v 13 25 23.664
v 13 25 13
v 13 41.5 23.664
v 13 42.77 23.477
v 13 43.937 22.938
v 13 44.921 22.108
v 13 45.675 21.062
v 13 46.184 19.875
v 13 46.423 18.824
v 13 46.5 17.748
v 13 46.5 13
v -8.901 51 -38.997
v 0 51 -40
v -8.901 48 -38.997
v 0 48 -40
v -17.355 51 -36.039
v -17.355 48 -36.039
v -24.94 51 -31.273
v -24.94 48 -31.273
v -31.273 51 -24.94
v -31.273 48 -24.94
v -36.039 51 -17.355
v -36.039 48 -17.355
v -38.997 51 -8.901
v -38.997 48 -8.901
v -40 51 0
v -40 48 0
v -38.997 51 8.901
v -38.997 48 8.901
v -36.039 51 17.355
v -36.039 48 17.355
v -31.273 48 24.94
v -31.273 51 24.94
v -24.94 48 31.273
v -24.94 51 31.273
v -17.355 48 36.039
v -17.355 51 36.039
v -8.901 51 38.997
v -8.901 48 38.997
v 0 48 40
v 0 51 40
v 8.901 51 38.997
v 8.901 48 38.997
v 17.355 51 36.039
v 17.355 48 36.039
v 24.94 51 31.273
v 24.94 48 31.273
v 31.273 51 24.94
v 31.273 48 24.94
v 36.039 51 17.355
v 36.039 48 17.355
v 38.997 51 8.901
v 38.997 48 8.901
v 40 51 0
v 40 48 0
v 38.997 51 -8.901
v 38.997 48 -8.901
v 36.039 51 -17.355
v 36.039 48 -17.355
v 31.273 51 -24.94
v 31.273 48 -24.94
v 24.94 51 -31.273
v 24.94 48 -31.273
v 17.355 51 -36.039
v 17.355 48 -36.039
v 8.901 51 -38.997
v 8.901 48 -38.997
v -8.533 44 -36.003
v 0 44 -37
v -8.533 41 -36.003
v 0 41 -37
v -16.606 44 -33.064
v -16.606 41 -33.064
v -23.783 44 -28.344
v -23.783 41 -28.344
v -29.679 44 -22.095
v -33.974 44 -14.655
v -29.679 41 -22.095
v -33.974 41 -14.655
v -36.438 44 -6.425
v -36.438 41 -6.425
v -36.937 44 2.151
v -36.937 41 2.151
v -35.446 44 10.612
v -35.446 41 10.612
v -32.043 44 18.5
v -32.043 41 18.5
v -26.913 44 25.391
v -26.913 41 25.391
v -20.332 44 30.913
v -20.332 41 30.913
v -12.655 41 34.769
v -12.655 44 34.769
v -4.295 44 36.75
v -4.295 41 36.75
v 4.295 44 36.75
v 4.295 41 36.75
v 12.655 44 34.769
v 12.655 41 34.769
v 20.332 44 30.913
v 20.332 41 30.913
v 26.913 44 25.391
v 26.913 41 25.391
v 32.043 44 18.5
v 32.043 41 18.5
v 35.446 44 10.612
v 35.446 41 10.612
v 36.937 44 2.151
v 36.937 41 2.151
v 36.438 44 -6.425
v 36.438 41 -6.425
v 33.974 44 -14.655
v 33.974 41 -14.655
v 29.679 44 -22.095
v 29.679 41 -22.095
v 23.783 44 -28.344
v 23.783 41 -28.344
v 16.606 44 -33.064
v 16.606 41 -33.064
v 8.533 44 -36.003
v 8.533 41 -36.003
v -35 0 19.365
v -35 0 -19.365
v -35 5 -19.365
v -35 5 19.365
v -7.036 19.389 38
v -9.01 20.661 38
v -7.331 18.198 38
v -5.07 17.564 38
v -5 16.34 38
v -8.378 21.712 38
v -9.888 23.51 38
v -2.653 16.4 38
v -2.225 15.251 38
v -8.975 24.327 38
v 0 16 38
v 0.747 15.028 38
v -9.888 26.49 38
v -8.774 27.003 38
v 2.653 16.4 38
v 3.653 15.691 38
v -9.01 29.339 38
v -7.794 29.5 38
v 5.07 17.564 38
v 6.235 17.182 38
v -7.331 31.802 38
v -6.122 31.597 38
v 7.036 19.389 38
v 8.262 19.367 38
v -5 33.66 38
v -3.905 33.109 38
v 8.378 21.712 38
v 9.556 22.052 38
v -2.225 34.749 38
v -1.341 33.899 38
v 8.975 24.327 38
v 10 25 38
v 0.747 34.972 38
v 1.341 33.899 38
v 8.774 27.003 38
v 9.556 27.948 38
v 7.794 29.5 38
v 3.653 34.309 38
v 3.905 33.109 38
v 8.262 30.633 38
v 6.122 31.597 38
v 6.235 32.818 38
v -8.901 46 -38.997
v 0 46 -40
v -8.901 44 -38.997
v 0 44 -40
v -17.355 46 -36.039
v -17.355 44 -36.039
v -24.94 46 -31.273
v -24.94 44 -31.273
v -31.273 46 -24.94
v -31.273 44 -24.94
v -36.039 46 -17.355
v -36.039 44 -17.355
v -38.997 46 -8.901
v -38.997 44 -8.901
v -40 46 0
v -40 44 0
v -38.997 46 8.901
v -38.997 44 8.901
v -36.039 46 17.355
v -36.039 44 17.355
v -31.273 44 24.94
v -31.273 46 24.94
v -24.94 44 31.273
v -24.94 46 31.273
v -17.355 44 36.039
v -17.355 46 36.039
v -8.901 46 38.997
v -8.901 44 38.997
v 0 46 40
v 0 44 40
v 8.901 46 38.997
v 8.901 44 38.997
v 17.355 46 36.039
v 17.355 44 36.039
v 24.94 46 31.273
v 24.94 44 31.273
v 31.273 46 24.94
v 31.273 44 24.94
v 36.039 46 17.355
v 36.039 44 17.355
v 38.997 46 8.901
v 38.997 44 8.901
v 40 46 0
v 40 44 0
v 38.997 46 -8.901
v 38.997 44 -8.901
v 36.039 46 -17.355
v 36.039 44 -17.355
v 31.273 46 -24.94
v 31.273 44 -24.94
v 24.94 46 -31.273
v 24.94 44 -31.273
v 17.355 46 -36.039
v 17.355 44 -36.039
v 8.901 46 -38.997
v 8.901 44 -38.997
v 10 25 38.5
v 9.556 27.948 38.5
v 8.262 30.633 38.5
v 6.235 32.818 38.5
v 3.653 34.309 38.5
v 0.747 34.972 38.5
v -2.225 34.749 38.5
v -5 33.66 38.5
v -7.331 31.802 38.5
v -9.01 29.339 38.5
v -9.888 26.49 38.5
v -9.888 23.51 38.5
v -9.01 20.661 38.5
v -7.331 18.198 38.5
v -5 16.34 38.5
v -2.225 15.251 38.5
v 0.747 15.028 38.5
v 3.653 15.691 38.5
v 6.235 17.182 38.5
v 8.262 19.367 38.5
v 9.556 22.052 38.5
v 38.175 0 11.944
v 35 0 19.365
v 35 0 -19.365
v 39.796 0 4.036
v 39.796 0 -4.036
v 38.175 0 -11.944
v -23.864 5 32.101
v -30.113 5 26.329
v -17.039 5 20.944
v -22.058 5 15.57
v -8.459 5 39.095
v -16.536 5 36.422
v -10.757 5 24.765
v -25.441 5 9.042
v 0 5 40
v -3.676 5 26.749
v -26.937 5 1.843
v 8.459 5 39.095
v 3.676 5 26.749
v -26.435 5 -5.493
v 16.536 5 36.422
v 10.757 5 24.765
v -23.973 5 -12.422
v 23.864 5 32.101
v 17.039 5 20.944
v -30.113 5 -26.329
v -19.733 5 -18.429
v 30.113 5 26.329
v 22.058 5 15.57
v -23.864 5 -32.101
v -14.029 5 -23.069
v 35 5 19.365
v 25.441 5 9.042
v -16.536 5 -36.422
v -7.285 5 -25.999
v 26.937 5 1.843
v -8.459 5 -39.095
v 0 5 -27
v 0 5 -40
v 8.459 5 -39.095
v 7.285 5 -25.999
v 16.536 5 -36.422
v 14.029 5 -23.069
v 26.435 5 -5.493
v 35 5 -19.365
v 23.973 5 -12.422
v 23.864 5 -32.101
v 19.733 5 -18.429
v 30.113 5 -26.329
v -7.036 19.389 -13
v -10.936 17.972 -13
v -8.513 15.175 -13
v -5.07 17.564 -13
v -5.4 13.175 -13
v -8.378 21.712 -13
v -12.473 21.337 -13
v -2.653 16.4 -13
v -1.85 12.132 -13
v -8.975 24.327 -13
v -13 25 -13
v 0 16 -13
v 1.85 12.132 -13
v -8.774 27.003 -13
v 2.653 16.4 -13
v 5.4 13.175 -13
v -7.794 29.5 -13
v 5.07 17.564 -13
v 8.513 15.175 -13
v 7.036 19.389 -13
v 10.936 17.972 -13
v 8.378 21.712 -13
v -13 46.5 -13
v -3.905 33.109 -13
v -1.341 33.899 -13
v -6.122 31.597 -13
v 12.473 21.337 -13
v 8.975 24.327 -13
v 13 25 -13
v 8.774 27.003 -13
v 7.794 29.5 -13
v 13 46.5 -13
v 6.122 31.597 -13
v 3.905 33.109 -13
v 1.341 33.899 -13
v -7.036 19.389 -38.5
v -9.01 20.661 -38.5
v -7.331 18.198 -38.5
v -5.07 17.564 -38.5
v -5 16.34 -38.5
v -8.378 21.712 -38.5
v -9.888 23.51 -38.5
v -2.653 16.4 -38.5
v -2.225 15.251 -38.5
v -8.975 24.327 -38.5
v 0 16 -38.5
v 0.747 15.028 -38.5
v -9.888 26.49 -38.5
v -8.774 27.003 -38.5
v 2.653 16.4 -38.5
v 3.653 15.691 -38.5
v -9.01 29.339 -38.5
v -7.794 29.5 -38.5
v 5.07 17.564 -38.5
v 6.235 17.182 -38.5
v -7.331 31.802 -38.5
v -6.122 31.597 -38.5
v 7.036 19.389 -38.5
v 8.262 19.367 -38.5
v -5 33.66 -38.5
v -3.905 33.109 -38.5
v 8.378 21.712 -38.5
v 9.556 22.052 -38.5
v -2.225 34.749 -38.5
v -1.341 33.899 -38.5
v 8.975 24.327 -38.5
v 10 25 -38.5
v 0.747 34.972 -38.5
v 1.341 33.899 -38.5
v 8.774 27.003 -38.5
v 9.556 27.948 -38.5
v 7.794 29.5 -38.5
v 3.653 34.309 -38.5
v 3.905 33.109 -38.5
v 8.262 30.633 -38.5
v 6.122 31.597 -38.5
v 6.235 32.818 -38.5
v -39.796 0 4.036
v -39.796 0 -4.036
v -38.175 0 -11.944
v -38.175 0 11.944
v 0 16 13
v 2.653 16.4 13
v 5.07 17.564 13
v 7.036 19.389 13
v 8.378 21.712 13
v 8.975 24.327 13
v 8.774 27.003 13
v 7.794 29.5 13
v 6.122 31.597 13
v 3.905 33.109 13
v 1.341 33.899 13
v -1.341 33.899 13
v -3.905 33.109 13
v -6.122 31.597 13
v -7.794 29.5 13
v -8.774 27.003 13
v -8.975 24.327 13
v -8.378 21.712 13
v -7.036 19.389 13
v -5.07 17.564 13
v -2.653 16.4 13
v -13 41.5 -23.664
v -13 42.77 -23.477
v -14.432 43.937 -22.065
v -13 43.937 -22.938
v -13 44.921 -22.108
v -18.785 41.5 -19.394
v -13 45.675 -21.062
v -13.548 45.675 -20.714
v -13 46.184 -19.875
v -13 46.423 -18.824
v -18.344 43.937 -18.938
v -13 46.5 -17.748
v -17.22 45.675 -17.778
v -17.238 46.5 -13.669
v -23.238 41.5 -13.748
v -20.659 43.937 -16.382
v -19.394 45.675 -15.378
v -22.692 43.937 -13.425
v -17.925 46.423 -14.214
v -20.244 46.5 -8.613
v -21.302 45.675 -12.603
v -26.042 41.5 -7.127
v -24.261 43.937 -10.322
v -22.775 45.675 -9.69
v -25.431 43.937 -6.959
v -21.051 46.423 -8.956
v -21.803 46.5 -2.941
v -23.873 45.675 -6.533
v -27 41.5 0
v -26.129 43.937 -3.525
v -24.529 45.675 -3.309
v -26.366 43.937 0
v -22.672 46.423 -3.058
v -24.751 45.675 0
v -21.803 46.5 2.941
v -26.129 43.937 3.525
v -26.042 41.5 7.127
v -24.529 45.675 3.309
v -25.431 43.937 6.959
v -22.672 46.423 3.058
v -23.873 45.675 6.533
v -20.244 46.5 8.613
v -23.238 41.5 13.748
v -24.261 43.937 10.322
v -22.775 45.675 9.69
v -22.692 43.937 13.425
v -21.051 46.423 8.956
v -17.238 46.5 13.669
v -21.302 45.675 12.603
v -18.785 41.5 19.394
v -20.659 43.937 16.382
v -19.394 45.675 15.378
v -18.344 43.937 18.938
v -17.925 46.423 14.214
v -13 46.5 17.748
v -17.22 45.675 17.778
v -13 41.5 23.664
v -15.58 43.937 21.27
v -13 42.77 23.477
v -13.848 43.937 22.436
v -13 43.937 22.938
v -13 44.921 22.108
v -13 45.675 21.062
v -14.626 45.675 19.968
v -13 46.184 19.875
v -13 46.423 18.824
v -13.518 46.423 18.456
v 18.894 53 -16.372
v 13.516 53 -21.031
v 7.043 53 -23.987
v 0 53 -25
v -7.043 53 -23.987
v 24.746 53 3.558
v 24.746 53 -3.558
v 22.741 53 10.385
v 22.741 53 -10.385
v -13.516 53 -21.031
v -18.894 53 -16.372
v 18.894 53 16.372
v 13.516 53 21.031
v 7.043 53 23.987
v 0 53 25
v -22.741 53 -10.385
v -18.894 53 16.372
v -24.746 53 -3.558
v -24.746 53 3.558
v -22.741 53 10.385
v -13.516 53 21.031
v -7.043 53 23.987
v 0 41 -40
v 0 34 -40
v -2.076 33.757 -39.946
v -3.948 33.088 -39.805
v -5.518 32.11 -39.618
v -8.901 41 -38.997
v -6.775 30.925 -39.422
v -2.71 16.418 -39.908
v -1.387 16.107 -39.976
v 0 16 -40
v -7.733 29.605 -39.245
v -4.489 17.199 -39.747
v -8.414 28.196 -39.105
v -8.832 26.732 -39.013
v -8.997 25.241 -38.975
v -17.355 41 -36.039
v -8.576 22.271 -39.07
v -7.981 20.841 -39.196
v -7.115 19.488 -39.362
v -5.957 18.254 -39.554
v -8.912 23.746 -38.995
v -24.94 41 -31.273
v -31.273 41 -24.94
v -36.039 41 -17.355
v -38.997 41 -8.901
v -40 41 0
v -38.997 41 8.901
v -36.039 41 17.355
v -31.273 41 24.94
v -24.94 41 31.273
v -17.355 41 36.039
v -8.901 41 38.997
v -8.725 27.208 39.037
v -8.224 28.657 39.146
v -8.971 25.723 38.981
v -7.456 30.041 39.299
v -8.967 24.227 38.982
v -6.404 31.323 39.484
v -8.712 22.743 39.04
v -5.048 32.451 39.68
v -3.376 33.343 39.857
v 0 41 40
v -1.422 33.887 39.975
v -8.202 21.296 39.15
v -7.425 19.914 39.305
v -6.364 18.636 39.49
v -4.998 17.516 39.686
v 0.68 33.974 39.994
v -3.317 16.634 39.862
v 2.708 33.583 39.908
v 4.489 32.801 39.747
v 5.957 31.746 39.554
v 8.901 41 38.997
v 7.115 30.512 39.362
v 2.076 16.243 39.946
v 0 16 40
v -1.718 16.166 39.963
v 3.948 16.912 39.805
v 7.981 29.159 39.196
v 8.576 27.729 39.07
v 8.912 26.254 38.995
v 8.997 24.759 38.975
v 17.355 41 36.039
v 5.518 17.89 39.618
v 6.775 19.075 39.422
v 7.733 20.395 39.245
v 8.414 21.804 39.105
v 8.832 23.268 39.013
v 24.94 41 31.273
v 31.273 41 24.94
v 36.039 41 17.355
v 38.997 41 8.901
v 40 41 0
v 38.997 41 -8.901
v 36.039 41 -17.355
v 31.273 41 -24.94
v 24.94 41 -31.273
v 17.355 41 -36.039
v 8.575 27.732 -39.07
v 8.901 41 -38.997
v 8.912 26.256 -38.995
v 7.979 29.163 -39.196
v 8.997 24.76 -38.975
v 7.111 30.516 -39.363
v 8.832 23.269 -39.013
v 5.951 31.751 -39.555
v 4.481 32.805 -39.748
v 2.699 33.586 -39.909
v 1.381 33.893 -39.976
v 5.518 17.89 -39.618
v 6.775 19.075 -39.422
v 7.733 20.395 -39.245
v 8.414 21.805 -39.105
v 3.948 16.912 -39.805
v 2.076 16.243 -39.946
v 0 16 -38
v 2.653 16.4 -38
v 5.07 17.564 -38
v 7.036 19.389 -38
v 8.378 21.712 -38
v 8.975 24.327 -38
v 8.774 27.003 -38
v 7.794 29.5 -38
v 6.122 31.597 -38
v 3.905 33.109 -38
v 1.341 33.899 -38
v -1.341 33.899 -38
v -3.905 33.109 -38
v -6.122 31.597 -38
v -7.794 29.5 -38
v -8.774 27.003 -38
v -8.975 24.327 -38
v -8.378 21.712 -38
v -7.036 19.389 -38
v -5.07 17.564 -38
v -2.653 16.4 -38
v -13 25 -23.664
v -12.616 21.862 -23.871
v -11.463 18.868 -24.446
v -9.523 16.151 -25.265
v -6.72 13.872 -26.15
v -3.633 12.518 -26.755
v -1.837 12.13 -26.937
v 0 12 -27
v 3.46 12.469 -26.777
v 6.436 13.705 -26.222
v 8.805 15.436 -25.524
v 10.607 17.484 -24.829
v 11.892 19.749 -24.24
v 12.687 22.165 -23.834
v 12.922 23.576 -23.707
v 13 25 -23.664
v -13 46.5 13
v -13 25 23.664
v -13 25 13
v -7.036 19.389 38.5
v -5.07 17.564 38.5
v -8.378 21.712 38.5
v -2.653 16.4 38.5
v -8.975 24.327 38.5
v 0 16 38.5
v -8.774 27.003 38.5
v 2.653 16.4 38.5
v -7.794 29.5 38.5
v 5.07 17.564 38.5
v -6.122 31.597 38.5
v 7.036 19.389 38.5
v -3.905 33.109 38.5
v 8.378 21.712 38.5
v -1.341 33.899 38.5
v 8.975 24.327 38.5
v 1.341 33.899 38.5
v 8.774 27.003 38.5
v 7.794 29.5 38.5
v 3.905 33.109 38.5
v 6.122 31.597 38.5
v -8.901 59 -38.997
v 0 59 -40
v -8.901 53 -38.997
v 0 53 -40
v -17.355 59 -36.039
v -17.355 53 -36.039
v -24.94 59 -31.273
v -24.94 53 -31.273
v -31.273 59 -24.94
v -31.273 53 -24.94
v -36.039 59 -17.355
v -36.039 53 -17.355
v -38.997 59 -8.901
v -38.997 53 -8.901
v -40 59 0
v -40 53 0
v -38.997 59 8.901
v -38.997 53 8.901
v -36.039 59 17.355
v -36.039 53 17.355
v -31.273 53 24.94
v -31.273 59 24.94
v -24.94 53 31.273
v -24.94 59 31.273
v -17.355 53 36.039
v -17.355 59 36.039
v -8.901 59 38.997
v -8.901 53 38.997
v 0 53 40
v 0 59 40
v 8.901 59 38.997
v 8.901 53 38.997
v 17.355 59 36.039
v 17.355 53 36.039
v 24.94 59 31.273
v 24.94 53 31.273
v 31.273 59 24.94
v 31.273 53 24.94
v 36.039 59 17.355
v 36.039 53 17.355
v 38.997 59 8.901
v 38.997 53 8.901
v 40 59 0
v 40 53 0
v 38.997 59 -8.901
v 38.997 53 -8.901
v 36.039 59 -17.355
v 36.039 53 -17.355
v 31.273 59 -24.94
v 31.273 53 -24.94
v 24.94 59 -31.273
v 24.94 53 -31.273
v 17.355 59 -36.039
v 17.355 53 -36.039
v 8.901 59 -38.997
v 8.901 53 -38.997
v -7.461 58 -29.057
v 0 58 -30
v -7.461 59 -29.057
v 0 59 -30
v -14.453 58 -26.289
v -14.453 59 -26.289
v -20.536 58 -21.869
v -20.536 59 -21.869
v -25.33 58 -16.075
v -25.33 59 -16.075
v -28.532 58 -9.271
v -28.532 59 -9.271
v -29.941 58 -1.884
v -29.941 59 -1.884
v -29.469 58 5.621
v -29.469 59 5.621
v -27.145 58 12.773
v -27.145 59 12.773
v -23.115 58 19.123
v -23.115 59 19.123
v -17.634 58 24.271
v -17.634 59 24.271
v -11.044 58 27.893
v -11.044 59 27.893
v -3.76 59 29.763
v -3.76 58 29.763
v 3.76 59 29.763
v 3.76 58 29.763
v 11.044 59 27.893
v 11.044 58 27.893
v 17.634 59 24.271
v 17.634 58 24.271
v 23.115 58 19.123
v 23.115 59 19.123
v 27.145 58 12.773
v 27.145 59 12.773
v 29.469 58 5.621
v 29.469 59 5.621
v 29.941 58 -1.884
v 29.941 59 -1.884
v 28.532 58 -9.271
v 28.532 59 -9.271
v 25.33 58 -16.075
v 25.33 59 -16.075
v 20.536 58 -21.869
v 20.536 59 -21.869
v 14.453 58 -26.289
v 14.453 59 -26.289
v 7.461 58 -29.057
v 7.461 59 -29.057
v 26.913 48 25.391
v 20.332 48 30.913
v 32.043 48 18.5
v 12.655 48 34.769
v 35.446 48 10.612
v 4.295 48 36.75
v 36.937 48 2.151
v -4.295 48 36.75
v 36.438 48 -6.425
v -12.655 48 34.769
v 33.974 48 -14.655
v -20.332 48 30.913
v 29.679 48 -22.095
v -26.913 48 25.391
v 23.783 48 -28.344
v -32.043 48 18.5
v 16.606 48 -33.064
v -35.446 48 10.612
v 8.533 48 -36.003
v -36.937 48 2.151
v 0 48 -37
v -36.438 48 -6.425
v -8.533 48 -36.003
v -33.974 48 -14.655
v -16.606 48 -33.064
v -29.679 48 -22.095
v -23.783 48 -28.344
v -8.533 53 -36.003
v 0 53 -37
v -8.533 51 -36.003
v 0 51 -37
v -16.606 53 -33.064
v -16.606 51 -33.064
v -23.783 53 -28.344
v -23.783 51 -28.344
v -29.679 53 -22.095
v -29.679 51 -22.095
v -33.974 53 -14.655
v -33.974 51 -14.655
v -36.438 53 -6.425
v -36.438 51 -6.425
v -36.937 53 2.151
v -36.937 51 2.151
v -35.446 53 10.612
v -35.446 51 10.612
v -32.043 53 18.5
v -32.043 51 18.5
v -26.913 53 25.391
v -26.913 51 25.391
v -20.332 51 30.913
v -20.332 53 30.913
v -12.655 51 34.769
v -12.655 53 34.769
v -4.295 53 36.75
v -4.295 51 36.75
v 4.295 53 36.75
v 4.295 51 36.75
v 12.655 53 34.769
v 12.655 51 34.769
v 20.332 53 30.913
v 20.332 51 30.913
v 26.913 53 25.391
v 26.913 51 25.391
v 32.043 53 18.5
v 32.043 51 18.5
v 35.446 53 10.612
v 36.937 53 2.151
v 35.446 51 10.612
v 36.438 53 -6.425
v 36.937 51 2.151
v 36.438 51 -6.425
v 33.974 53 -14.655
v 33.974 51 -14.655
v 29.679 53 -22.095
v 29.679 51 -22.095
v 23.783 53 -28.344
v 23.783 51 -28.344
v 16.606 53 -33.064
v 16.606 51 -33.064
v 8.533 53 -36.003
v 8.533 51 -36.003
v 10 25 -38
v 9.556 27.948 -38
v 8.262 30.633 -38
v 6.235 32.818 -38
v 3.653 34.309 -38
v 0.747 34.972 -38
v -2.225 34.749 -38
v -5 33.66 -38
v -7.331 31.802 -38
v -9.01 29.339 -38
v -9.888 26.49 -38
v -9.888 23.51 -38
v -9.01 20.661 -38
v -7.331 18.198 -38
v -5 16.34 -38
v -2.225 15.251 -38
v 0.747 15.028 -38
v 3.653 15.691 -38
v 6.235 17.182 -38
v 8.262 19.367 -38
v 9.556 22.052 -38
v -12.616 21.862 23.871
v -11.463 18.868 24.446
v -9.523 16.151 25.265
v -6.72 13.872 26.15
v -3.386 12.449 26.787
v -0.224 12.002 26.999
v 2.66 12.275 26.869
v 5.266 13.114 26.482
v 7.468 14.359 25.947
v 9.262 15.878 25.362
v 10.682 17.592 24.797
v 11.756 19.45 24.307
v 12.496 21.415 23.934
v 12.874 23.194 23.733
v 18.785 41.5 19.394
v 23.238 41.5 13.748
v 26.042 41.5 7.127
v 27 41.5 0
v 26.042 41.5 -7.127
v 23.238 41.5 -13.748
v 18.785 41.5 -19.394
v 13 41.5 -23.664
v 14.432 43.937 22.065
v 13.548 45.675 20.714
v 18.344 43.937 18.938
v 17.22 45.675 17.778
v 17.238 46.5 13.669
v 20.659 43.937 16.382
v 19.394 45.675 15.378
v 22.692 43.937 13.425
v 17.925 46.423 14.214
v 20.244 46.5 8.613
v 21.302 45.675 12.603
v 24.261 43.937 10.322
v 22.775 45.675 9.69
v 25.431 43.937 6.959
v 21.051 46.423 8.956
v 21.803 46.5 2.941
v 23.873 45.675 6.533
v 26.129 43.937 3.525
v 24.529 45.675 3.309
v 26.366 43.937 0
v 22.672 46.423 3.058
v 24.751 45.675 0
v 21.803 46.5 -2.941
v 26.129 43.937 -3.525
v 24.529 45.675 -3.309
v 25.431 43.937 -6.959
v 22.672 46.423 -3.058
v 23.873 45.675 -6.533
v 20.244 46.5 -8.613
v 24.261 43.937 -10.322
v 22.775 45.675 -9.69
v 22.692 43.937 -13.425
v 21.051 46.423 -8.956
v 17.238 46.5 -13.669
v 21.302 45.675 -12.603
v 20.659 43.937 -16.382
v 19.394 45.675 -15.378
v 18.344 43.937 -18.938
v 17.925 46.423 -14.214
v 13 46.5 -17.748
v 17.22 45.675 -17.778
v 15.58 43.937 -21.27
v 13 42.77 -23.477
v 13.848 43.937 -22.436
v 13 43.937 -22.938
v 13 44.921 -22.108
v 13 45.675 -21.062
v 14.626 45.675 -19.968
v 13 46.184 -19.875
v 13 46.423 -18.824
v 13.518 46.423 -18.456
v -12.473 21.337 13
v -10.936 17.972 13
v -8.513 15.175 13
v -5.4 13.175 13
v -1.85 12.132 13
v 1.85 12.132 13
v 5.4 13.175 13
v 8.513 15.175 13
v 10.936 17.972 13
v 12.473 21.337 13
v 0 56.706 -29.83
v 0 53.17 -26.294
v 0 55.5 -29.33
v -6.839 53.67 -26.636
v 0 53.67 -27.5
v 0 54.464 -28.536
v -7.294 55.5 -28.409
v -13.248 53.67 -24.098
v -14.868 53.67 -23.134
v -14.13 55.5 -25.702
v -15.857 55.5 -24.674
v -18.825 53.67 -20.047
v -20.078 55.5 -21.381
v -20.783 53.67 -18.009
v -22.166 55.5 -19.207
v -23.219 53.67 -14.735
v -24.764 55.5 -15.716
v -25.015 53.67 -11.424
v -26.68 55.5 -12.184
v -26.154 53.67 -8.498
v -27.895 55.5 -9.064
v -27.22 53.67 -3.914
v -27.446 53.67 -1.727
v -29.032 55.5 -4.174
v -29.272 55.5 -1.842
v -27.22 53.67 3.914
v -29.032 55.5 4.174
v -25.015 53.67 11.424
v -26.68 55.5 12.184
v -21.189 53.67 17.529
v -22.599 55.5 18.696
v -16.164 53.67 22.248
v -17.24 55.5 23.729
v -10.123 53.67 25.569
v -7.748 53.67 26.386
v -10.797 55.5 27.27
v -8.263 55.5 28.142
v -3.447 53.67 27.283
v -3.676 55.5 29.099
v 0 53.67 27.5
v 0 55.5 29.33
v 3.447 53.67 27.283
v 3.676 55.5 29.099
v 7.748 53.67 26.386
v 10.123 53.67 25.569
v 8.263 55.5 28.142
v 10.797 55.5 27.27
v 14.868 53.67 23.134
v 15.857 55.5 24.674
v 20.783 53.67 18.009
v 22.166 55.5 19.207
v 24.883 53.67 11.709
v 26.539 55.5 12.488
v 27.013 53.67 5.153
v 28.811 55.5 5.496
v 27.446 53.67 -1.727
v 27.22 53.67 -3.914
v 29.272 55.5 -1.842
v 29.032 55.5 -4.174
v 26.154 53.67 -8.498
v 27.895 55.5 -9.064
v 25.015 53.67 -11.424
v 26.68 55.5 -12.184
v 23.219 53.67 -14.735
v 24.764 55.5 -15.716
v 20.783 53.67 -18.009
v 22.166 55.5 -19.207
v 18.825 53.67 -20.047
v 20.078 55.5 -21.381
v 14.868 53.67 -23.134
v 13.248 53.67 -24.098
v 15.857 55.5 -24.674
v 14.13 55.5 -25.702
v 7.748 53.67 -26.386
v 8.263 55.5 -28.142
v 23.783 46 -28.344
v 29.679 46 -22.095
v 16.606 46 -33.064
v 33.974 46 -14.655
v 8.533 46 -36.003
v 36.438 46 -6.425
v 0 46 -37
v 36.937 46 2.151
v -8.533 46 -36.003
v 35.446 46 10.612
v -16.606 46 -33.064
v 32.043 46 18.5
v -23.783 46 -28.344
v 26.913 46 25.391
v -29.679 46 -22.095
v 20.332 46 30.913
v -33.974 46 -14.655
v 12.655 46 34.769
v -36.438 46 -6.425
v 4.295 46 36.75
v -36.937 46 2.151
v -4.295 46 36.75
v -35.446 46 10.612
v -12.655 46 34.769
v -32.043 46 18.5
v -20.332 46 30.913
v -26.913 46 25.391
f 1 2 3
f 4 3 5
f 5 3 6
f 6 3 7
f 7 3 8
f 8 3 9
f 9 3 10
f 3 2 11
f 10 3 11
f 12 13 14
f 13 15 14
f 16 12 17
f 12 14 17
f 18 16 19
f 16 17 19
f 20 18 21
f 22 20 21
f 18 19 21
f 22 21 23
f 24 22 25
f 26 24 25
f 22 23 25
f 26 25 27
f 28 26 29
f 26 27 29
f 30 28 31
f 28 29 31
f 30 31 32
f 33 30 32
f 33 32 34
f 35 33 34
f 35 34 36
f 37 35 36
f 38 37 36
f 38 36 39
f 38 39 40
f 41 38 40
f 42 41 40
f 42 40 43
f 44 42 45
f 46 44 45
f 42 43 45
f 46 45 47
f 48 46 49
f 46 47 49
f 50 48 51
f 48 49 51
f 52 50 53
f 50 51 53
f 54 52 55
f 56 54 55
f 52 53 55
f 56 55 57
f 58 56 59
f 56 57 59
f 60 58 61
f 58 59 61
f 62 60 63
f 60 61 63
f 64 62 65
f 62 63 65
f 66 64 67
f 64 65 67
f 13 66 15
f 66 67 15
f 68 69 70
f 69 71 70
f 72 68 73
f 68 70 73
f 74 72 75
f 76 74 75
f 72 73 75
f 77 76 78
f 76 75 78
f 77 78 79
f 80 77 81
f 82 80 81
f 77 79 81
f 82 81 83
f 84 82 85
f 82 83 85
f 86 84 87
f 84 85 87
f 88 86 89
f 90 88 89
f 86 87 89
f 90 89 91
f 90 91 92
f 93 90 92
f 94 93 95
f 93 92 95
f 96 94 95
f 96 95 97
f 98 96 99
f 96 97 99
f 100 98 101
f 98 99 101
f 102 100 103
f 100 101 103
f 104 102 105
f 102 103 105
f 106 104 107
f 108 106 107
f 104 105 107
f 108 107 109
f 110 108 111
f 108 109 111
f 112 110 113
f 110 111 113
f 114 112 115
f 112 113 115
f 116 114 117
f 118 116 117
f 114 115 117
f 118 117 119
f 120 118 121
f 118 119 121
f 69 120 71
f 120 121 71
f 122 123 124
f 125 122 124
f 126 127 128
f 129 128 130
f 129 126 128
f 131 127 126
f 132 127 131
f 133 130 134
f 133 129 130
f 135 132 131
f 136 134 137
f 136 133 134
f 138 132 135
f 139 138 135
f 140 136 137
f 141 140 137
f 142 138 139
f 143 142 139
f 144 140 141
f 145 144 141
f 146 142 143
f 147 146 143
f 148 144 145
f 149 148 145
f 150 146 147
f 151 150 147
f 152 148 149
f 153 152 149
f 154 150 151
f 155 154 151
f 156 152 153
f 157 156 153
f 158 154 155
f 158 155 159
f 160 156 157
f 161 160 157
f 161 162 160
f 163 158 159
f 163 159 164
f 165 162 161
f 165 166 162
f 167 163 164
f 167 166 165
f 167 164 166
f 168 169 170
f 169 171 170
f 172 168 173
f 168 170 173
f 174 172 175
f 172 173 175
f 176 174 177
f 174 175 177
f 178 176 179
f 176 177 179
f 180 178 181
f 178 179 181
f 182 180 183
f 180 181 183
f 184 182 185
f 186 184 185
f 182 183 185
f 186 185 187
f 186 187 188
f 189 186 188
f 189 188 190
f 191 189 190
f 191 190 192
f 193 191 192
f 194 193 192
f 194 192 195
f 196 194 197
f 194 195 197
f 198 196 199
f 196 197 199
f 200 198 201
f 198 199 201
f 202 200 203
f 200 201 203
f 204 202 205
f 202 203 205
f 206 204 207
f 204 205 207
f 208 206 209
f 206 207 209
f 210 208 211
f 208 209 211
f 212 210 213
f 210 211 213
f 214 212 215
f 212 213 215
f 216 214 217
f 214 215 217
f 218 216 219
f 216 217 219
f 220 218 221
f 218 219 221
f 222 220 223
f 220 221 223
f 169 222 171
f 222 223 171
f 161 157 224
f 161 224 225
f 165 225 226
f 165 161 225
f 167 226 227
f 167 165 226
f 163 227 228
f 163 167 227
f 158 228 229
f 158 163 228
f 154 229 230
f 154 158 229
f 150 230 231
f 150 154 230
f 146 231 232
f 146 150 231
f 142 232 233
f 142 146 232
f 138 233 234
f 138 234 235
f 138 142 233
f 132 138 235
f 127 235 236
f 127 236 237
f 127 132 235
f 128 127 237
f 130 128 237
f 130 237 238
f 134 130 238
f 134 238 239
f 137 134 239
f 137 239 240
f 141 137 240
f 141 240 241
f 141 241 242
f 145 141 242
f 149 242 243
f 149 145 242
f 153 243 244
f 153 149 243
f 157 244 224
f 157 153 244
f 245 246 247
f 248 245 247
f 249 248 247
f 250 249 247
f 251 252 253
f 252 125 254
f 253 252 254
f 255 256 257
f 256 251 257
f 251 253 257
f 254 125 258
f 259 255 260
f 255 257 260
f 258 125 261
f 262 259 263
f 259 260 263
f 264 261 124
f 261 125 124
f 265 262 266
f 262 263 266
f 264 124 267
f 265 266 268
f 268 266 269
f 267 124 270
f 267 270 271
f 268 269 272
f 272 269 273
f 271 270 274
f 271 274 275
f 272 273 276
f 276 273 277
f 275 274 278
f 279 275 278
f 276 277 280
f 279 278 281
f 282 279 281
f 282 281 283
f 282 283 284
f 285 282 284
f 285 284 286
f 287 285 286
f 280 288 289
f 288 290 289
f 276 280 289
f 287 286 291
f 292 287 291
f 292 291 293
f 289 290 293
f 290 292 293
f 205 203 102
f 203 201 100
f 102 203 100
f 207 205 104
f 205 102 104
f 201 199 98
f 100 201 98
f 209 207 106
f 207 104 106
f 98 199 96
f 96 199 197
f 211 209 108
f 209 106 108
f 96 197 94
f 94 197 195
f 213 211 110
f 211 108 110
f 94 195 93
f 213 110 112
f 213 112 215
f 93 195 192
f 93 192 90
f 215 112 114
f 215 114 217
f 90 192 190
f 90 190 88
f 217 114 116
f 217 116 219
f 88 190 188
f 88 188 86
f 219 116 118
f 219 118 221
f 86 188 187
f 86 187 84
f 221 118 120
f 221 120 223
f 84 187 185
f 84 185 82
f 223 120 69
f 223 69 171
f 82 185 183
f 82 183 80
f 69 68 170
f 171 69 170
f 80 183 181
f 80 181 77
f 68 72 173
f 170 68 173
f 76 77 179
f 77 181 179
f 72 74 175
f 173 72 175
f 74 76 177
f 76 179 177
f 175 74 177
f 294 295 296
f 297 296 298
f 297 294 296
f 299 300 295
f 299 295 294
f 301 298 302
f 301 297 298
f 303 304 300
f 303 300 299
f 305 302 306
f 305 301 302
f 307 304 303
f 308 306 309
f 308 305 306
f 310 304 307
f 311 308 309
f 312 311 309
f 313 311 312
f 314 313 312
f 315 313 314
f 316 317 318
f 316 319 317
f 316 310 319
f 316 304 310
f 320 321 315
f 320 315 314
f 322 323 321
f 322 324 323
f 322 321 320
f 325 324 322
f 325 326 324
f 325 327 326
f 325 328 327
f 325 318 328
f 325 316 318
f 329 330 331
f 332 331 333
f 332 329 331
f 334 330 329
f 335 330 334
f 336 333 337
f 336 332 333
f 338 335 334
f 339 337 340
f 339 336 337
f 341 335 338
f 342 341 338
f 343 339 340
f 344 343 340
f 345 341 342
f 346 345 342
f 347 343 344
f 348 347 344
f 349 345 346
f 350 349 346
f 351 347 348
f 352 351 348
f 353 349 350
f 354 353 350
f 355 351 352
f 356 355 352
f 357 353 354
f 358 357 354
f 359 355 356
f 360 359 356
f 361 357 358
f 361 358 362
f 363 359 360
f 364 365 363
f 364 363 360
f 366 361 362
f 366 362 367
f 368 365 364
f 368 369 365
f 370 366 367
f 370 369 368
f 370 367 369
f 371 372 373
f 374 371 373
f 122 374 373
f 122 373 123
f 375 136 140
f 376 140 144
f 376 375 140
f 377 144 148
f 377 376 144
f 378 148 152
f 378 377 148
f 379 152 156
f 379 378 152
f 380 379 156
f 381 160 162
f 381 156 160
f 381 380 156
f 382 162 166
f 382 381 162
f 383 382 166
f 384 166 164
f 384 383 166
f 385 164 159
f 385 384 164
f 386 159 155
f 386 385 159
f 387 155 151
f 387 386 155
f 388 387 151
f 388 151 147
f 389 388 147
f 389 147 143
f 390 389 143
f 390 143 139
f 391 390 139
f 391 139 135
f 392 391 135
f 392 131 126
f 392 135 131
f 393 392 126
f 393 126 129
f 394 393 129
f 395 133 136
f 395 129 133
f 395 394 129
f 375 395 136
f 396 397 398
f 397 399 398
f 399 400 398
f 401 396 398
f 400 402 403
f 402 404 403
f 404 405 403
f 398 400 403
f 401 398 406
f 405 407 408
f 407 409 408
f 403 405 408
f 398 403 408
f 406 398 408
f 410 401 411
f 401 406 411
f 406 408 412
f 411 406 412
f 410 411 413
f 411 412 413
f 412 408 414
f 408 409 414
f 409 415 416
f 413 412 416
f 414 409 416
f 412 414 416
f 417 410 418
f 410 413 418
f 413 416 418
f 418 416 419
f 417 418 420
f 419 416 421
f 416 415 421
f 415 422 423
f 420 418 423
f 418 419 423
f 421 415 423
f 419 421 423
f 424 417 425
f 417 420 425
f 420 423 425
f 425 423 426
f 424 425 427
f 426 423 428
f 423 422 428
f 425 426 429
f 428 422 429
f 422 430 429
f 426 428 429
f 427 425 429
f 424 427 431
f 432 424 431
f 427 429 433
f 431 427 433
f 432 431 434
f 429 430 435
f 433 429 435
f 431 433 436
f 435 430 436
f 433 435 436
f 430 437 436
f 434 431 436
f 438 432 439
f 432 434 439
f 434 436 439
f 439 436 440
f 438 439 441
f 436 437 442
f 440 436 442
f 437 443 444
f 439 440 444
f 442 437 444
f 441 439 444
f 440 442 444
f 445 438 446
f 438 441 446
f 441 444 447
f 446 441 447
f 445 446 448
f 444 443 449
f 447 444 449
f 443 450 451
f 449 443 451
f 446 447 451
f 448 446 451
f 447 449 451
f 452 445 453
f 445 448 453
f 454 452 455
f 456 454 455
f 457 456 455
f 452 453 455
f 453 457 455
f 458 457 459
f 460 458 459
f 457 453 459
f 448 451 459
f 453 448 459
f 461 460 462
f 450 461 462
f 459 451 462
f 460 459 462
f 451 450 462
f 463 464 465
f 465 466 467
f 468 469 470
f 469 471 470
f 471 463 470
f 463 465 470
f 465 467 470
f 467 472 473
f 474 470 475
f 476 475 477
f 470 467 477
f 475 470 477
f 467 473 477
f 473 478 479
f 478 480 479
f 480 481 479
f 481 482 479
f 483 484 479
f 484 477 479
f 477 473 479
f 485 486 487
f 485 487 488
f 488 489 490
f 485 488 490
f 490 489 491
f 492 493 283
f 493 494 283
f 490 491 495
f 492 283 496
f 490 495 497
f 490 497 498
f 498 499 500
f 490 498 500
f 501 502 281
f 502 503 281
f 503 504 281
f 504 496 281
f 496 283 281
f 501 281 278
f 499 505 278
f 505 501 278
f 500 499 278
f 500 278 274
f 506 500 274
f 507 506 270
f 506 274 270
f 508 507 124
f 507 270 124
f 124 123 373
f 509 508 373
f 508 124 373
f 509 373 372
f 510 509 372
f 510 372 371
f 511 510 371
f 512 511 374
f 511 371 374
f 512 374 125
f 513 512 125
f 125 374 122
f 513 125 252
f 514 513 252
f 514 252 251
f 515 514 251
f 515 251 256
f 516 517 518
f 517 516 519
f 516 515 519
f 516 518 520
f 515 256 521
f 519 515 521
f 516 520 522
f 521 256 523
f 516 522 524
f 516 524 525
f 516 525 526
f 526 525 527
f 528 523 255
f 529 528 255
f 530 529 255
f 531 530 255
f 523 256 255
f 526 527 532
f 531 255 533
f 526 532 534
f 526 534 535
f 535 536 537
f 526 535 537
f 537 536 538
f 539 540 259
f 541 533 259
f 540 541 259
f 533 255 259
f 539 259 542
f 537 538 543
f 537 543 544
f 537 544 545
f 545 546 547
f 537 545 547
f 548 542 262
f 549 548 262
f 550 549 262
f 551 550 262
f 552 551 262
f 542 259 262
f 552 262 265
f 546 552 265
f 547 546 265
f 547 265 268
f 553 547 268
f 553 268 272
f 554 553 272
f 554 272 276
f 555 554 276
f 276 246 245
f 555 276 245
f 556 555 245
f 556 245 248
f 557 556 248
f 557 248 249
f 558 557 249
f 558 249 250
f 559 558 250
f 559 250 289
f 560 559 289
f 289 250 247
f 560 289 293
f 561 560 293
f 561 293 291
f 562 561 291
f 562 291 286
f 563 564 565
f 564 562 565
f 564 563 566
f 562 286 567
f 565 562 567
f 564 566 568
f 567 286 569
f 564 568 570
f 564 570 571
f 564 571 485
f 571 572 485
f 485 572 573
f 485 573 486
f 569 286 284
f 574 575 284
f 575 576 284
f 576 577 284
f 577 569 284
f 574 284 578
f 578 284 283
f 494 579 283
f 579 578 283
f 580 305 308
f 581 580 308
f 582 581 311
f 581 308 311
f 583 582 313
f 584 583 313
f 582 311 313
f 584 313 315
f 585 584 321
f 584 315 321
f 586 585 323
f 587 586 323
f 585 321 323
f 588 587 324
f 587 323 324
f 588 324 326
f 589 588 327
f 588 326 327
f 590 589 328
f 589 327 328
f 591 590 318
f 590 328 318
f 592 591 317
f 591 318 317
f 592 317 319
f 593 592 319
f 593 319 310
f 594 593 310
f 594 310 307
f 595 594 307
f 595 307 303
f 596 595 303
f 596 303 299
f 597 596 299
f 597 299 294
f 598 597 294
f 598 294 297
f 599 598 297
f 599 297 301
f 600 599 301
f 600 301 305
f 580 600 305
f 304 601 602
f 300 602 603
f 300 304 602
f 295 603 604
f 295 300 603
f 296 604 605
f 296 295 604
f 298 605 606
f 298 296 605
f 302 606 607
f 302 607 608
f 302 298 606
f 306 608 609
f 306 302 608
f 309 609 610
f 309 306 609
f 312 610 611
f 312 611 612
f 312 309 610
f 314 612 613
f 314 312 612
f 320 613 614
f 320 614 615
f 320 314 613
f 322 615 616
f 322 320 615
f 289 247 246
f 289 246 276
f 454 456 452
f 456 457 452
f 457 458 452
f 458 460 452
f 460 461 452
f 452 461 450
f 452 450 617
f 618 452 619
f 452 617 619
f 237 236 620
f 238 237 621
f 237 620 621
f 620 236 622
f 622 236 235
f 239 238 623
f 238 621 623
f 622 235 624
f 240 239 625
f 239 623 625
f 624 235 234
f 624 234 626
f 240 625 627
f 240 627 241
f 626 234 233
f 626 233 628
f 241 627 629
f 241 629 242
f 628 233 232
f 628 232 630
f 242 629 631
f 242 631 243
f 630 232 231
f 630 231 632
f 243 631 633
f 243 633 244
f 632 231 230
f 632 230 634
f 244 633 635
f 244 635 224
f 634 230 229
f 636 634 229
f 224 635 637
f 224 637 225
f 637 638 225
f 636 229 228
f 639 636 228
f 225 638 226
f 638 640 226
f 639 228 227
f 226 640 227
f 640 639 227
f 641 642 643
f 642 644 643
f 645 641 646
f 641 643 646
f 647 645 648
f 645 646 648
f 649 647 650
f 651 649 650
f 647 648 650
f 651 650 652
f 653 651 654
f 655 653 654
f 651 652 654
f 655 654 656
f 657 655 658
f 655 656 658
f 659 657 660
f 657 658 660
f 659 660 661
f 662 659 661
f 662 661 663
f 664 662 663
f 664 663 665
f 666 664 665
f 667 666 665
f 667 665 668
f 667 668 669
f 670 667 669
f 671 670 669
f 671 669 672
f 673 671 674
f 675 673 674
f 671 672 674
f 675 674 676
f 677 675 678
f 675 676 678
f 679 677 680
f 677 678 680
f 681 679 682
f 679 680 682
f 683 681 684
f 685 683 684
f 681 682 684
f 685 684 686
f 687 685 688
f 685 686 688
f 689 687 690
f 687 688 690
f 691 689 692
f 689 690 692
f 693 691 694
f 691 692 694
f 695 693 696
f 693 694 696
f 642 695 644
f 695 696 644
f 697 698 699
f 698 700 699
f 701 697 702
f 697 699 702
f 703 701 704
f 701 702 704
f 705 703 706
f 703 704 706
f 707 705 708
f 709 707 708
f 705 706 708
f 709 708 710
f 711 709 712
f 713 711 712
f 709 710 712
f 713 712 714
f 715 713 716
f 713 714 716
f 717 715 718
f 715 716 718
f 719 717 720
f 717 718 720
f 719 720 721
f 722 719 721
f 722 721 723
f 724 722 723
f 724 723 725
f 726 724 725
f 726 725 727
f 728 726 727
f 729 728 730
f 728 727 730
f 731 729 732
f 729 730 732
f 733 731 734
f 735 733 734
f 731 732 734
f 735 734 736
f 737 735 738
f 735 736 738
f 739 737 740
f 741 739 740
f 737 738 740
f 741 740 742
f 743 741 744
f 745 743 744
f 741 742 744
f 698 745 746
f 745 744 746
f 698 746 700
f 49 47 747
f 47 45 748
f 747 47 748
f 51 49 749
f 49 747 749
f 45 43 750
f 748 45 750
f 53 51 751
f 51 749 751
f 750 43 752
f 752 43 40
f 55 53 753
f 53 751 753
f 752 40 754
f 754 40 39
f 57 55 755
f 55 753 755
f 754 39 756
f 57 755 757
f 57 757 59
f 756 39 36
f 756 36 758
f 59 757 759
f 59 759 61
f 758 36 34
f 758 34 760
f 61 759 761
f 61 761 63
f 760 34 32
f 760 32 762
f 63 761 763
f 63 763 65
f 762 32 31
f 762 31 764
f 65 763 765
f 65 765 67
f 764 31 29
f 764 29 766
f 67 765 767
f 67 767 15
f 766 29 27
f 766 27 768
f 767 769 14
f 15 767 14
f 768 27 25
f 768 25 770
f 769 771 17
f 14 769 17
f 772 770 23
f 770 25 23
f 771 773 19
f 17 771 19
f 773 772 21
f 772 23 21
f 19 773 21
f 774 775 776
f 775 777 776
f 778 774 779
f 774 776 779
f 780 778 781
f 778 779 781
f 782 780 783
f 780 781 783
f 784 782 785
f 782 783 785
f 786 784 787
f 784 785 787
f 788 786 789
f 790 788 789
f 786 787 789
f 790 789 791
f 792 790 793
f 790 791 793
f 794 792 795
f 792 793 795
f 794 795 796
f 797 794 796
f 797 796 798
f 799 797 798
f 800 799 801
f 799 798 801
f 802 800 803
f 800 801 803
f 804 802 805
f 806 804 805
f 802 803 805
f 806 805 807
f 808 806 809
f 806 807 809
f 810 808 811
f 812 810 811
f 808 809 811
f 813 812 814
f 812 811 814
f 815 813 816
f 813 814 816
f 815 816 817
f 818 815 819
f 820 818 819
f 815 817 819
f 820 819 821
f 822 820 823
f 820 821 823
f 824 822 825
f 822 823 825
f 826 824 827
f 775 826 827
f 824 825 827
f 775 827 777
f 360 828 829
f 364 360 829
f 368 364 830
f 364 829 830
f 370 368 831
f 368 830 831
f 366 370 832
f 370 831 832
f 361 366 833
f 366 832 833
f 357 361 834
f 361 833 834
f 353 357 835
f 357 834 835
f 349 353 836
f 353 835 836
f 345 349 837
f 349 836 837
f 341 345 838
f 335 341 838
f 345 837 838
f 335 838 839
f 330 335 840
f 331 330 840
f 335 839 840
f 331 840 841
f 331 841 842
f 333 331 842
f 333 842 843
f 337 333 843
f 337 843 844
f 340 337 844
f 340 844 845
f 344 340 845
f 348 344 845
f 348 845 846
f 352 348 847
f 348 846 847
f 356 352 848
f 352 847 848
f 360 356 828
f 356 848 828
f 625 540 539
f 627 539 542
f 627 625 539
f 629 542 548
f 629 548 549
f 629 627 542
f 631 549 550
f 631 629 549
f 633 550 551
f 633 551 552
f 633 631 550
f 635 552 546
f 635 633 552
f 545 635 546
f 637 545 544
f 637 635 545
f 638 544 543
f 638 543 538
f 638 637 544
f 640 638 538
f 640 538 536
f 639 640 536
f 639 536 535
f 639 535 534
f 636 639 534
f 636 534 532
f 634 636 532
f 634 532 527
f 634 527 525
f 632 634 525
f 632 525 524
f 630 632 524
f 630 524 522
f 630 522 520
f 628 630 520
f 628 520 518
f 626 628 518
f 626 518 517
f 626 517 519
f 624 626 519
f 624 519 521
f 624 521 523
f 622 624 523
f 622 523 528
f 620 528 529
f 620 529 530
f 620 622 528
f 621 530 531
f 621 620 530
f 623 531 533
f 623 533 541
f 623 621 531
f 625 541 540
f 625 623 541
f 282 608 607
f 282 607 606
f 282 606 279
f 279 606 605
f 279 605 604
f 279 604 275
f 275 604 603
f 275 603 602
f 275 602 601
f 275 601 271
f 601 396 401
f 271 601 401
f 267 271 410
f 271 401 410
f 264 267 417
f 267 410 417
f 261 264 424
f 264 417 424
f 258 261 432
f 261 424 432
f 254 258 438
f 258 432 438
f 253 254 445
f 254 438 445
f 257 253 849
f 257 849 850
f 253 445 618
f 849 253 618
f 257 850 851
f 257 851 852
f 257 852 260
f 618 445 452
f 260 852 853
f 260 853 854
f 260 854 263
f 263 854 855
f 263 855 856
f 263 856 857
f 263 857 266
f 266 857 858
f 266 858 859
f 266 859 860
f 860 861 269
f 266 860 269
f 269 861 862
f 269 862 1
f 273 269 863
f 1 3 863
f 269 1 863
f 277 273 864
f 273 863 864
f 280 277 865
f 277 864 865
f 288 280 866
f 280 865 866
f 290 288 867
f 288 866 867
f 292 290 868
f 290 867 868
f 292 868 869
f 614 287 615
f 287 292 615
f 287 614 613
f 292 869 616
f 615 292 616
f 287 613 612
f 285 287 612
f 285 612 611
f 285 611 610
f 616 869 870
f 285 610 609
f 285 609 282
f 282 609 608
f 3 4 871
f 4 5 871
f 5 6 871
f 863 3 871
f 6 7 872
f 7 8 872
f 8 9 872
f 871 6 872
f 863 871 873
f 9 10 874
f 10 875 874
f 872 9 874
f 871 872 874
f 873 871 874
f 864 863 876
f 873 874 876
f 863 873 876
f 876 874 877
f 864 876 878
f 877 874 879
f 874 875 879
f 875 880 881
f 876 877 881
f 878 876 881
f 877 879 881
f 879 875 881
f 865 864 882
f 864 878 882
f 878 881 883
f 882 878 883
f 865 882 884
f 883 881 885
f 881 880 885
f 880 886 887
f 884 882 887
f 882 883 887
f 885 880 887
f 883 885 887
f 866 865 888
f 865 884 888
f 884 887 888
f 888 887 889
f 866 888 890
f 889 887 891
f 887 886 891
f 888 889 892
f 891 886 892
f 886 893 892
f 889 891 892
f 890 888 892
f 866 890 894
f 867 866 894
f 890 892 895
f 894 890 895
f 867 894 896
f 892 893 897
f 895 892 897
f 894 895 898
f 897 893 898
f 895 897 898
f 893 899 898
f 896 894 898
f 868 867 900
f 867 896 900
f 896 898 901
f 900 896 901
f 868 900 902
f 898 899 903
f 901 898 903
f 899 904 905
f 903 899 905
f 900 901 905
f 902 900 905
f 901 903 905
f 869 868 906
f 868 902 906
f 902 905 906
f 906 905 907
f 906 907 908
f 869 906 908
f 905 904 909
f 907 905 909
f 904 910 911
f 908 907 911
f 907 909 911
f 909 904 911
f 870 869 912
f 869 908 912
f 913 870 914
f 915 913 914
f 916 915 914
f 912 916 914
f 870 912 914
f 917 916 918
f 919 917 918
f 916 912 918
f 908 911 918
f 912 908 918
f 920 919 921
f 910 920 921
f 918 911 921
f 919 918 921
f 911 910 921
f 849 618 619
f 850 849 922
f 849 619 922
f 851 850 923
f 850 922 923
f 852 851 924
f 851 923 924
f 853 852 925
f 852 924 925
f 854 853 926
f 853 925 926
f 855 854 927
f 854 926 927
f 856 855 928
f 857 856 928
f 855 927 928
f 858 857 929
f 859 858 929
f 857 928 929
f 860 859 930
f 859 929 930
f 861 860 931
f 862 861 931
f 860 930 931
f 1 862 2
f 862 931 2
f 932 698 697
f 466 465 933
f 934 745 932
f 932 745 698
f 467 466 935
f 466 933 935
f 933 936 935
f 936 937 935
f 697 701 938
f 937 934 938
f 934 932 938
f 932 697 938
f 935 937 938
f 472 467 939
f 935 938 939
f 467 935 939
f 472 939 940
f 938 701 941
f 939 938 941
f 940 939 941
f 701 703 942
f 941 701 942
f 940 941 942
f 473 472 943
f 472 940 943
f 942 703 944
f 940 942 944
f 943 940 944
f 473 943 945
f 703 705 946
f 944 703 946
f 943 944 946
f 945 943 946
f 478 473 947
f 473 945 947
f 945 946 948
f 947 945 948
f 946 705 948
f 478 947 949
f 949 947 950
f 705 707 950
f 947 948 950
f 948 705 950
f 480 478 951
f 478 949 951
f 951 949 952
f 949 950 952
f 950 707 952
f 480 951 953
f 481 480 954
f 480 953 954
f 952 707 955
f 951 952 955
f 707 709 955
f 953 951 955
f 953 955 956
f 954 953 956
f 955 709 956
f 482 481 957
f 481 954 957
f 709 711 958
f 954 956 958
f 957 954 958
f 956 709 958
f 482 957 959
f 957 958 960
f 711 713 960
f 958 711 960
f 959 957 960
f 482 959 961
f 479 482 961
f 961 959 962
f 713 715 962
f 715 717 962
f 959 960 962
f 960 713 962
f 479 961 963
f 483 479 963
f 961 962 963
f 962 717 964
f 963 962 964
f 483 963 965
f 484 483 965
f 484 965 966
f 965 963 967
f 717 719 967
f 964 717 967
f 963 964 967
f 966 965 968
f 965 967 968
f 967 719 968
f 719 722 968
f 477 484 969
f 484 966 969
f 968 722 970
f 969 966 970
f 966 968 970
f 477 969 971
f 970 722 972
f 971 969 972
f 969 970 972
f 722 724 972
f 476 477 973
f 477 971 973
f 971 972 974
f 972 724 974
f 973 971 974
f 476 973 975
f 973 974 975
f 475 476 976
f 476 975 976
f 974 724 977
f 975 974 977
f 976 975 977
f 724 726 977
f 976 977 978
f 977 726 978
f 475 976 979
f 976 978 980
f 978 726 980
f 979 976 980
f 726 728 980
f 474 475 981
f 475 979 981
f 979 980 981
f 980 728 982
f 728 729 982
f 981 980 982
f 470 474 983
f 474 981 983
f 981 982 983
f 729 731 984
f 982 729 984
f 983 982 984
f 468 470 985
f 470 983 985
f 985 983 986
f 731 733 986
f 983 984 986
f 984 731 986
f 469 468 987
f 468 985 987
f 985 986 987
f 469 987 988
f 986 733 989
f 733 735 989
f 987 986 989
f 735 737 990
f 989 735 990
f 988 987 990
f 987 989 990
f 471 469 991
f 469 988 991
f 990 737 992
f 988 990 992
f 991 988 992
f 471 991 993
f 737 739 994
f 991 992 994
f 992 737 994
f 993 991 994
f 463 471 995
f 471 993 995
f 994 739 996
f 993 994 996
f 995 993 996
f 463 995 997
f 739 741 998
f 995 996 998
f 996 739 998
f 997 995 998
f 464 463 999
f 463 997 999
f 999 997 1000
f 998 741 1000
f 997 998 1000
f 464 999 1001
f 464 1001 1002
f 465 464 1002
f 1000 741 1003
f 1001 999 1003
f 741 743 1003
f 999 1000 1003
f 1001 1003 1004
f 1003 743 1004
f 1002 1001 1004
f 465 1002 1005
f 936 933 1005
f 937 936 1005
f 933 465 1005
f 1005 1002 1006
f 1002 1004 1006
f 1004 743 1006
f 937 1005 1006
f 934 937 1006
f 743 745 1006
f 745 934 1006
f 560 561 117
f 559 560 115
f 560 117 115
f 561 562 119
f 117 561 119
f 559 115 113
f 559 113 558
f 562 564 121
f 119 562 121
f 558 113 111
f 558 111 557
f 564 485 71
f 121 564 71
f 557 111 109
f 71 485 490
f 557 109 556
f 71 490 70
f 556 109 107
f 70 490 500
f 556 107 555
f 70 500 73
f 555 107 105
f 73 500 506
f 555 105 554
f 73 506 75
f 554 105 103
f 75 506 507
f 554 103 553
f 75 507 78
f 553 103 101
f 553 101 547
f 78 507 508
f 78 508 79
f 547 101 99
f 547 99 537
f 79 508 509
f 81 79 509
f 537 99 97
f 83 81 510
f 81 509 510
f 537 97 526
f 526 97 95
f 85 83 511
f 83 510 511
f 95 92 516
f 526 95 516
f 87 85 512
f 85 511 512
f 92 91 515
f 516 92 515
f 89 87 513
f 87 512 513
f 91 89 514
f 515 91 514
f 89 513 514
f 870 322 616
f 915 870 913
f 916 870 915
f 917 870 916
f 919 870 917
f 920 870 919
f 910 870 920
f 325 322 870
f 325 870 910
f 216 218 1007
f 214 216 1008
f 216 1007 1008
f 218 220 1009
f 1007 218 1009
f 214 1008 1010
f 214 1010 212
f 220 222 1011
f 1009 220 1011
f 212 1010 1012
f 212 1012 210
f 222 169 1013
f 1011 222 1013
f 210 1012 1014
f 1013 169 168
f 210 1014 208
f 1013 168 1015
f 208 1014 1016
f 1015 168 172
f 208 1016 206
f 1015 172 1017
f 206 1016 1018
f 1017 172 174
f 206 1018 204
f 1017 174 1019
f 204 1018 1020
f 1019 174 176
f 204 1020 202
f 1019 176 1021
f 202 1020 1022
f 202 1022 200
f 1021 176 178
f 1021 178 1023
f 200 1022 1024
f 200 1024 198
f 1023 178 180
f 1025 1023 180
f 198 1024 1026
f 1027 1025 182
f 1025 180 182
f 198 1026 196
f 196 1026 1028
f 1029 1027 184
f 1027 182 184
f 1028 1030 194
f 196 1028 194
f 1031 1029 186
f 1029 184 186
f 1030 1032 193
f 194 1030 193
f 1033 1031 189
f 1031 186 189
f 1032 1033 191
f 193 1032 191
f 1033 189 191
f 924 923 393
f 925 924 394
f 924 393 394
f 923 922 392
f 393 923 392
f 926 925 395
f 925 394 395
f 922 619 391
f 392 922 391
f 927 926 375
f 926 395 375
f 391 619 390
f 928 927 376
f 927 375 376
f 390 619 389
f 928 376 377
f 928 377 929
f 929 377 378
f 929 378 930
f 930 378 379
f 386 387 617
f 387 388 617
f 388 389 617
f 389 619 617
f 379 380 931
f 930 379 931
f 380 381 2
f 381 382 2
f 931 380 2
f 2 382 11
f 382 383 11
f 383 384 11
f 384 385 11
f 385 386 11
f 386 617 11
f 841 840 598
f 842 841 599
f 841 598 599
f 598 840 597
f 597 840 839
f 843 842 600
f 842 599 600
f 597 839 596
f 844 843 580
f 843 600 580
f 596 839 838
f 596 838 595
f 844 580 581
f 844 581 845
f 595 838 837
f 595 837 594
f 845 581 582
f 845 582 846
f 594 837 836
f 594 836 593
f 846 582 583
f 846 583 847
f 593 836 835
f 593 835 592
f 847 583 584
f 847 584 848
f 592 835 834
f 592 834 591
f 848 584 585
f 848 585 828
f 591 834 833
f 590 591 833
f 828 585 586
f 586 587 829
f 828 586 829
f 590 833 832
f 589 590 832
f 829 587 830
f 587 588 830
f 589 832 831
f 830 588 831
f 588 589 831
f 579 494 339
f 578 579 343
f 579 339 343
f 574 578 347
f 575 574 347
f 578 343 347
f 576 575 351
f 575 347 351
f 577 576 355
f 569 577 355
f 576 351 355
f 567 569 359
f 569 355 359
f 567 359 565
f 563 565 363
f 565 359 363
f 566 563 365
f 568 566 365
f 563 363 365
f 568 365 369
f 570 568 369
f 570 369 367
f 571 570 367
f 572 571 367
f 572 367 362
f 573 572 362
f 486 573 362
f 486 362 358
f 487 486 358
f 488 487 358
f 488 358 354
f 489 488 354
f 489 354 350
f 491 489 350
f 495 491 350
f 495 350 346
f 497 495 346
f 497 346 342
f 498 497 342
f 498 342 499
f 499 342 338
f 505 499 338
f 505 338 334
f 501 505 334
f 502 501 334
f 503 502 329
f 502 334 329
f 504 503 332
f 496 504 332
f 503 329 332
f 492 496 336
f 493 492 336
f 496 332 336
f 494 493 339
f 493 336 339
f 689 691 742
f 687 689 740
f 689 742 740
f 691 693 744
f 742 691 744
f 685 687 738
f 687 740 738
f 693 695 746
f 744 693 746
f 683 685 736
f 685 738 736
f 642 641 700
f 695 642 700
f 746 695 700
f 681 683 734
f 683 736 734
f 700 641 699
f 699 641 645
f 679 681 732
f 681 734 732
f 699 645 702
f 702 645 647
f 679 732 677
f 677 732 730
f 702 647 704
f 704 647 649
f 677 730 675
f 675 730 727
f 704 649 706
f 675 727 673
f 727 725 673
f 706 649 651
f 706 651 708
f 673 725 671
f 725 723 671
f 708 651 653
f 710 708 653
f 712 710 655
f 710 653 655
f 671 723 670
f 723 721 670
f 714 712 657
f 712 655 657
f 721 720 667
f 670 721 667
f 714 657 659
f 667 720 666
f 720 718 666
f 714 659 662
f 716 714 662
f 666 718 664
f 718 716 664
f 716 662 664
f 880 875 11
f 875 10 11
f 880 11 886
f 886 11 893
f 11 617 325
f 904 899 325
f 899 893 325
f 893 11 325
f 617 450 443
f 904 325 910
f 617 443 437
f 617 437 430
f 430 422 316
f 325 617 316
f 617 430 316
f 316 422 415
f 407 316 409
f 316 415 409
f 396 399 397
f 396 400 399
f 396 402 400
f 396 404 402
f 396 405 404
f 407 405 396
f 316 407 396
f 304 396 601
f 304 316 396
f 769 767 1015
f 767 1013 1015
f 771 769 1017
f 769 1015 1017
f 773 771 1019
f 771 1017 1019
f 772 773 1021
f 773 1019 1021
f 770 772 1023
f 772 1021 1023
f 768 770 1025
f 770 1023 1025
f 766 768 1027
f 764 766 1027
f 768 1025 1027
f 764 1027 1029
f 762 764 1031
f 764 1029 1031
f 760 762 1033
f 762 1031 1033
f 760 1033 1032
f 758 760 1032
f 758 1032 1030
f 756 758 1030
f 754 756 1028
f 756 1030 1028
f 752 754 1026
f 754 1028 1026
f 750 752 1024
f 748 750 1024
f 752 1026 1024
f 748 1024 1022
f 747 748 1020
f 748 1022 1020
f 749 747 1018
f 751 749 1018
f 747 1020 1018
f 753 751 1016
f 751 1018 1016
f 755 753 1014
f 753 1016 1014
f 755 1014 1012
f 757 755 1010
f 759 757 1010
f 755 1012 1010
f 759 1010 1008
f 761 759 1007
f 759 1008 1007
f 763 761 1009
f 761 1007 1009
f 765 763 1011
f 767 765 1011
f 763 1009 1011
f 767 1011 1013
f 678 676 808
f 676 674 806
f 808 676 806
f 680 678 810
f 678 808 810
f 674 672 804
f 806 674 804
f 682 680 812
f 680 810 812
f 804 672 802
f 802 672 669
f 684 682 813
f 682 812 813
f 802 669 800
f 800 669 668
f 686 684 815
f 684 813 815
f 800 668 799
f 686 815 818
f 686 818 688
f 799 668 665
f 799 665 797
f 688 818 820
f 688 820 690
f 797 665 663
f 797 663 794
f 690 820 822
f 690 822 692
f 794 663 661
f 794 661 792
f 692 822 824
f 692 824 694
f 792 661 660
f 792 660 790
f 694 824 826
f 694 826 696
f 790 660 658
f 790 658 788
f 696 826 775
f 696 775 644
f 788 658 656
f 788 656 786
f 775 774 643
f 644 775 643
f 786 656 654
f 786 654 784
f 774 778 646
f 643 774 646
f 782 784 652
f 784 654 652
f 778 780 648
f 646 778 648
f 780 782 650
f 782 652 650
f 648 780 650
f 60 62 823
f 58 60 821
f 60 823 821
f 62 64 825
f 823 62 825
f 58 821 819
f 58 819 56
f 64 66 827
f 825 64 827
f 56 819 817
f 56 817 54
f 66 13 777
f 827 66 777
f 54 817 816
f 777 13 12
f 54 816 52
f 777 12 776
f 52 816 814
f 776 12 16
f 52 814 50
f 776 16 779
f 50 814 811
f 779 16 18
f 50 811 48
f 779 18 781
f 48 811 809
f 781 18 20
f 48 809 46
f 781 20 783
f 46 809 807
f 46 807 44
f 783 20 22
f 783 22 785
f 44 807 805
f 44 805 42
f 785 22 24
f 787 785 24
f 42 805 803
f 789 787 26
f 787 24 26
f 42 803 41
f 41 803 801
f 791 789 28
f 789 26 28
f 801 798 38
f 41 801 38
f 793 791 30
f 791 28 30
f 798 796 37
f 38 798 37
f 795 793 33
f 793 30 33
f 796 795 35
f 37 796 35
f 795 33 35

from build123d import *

# Parameters (mm, degrees)
EXTRUDE_1_REACH          = 90.826
EXTRUDE_1_END_RADIUS     = 27
SKETCH_2_R               = 13
SKETCH_4_R               = 9
CUT_EXTRUDE_2_DEPTH      = 89.825671965
SKETCH_5_R               = 10
CUT_EXTRUDE_3_DEPTH      = 0.5
EXTRUDE_1_2_REACH        = 90.826
CUT_EXTRUDE_4_DEPTH      = 82.737384446
CUT_EXTRUDE_4_DEPTH_BACK = 82.737384446
SKETCH_6_W               = 70
SKETCH_6_H               = 5


with BuildPart() as part:
    # 草图1 → 旋转1 (revolve)
    with BuildSketch(Plane.XY, mode=Mode.PRIVATE) as revolve_1_sk:
        with BuildLine():
            Line((0, 53), (25, 53))
            ThreePointArc((25, 53), (28.535533906, 54.464466094), (30, 58))
            Line((30, 58), (30, 59))
            Line((30, 59), (40, 59))
            Line((40, 59), (40, 53))
            Line((40, 53), (37, 53))
            Line((37, 53), (37, 51))
            Line((37, 51), (40, 51))
            Line((40, 51), (40, 48))
            Line((40, 48), (37, 48))
            Line((37, 48), (37, 46))
            Line((37, 46), (40, 46))
            Line((40, 46), (40, 44))
            Line((40, 44), (37, 44))
            Line((37, 44), (37, 41))
            Line((37, 41), (40, 41))
            Line((40, 41), (40, 0))
            Line((40, 0), (27, 0))
            Line((27, 0), (27, 41.5))
            ThreePointArc((27, 41.5), (25.535533906, 45.035533906), (22, 46.5))
            Line((22, 46.5), (0, 46.5))
            Line((0, 46.5), (0, 53))
        make_face()
    revolve(revolve_1_sk.sketch.rotate(Axis((0, -5, 0), (0, 1, 0)), 90), axis=Axis((0, -5, 0), (0, 1, 0)))

    # Extrude 1: up to this cylinder (the profile starts inside it)
    extrude_1_end = Plane(origin=(0, 25, 0), z_dir=(0, -1, 0)) * Cylinder(EXTRUDE_1_END_RADIUS, 236.652, mode=Mode.PRIVATE)
    # 草图2 → Extrude 1 (add, up to the surface)
    with BuildSketch(Plane.XY.offset(13), mode=Mode.PRIVATE) as extrude_1_sk1:
        with Locations(Location((0, 25, 0), (0, 0, 180))):
            Circle(SKETCH_2_R)
    extrude_1_tool1 = extrude(extrude_1_sk1.sketch, amount=EXTRUDE_1_REACH, mode=Mode.PRIVATE) & extrude_1_end
    extrude_1 = extrude_1_tool1.solids().sort_by_distance((0, 25, 13))[0]
    add(extrude_1)

    # 草图4 → 切除-拉伸2 (cut, through all)
    with BuildSketch(Plane.XY.offset(13)):
        with Locations(Location((0, 25, 0), (0, 0, 270))):
            Circle(SKETCH_4_R)
    cut_extrude_2 = extrude(amount=CUT_EXTRUDE_2_DEPTH, mode=Mode.SUBTRACT)

    # 草图5 → 切除-拉伸3 (cut)
    with BuildSketch(Plane.XY.offset(38)):
        with Locations((0, 25)):
            Circle(SKETCH_5_R)
    cut_extrude_3 = extrude(amount=CUT_EXTRUDE_3_DEPTH, mode=Mode.SUBTRACT)

    # 草图7 → Extrude 1 2 (add, up to next)
    with BuildSketch(Plane(origin=(0, 0, 13), x_dir=(-1, 0, 0), z_dir=(0, 0, -1)), mode=Mode.PRIVATE) as extrude_1_2_sk1:
        with BuildLine():
            Line((-13, 25), (-13, 46.5))
            Line((-13, 46.5), (13, 46.5))
            Line((13, 46.5), (13, 25))
            ThreePointArc((13, 25), (0, 38), (-13, 25))
        make_face()
    extrude_1_2_tool1 = extrude(extrude_1_2_sk1.sketch, amount=-EXTRUDE_1_2_REACH, mode=Mode.PRIVATE) - part.part
    extrude_1_2 = extrude_1_2_tool1.solids().sort_by_distance((0, 40.482231, 13))[0]
    add(extrude_1_2)

    # 镜向1: Extrude 1, 切除-拉伸2, 切除-拉伸3, Extrude 1 2 across plane
    add(extrude_1.mirror(Plane.XY))
    add(cut_extrude_2.mirror(Plane.XY), mode=Mode.SUBTRACT)
    add(cut_extrude_3.mirror(Plane.XY), mode=Mode.SUBTRACT)
    add(extrude_1_2.mirror(Plane.XY))

    # 草图6 → 切除-拉伸4 (cut, two sides: drawn at the far end of the back side and taken through both)
    with BuildSketch(Plane.XY.offset(-CUT_EXTRUDE_4_DEPTH_BACK)):
        with Locations((0, 2.5)):
            Rectangle(SKETCH_6_W, SKETCH_6_H)
    extrude(amount=CUT_EXTRUDE_4_DEPTH + CUT_EXTRUDE_4_DEPTH_BACK, mode=Mode.SUBTRACT)


solid = part.part
